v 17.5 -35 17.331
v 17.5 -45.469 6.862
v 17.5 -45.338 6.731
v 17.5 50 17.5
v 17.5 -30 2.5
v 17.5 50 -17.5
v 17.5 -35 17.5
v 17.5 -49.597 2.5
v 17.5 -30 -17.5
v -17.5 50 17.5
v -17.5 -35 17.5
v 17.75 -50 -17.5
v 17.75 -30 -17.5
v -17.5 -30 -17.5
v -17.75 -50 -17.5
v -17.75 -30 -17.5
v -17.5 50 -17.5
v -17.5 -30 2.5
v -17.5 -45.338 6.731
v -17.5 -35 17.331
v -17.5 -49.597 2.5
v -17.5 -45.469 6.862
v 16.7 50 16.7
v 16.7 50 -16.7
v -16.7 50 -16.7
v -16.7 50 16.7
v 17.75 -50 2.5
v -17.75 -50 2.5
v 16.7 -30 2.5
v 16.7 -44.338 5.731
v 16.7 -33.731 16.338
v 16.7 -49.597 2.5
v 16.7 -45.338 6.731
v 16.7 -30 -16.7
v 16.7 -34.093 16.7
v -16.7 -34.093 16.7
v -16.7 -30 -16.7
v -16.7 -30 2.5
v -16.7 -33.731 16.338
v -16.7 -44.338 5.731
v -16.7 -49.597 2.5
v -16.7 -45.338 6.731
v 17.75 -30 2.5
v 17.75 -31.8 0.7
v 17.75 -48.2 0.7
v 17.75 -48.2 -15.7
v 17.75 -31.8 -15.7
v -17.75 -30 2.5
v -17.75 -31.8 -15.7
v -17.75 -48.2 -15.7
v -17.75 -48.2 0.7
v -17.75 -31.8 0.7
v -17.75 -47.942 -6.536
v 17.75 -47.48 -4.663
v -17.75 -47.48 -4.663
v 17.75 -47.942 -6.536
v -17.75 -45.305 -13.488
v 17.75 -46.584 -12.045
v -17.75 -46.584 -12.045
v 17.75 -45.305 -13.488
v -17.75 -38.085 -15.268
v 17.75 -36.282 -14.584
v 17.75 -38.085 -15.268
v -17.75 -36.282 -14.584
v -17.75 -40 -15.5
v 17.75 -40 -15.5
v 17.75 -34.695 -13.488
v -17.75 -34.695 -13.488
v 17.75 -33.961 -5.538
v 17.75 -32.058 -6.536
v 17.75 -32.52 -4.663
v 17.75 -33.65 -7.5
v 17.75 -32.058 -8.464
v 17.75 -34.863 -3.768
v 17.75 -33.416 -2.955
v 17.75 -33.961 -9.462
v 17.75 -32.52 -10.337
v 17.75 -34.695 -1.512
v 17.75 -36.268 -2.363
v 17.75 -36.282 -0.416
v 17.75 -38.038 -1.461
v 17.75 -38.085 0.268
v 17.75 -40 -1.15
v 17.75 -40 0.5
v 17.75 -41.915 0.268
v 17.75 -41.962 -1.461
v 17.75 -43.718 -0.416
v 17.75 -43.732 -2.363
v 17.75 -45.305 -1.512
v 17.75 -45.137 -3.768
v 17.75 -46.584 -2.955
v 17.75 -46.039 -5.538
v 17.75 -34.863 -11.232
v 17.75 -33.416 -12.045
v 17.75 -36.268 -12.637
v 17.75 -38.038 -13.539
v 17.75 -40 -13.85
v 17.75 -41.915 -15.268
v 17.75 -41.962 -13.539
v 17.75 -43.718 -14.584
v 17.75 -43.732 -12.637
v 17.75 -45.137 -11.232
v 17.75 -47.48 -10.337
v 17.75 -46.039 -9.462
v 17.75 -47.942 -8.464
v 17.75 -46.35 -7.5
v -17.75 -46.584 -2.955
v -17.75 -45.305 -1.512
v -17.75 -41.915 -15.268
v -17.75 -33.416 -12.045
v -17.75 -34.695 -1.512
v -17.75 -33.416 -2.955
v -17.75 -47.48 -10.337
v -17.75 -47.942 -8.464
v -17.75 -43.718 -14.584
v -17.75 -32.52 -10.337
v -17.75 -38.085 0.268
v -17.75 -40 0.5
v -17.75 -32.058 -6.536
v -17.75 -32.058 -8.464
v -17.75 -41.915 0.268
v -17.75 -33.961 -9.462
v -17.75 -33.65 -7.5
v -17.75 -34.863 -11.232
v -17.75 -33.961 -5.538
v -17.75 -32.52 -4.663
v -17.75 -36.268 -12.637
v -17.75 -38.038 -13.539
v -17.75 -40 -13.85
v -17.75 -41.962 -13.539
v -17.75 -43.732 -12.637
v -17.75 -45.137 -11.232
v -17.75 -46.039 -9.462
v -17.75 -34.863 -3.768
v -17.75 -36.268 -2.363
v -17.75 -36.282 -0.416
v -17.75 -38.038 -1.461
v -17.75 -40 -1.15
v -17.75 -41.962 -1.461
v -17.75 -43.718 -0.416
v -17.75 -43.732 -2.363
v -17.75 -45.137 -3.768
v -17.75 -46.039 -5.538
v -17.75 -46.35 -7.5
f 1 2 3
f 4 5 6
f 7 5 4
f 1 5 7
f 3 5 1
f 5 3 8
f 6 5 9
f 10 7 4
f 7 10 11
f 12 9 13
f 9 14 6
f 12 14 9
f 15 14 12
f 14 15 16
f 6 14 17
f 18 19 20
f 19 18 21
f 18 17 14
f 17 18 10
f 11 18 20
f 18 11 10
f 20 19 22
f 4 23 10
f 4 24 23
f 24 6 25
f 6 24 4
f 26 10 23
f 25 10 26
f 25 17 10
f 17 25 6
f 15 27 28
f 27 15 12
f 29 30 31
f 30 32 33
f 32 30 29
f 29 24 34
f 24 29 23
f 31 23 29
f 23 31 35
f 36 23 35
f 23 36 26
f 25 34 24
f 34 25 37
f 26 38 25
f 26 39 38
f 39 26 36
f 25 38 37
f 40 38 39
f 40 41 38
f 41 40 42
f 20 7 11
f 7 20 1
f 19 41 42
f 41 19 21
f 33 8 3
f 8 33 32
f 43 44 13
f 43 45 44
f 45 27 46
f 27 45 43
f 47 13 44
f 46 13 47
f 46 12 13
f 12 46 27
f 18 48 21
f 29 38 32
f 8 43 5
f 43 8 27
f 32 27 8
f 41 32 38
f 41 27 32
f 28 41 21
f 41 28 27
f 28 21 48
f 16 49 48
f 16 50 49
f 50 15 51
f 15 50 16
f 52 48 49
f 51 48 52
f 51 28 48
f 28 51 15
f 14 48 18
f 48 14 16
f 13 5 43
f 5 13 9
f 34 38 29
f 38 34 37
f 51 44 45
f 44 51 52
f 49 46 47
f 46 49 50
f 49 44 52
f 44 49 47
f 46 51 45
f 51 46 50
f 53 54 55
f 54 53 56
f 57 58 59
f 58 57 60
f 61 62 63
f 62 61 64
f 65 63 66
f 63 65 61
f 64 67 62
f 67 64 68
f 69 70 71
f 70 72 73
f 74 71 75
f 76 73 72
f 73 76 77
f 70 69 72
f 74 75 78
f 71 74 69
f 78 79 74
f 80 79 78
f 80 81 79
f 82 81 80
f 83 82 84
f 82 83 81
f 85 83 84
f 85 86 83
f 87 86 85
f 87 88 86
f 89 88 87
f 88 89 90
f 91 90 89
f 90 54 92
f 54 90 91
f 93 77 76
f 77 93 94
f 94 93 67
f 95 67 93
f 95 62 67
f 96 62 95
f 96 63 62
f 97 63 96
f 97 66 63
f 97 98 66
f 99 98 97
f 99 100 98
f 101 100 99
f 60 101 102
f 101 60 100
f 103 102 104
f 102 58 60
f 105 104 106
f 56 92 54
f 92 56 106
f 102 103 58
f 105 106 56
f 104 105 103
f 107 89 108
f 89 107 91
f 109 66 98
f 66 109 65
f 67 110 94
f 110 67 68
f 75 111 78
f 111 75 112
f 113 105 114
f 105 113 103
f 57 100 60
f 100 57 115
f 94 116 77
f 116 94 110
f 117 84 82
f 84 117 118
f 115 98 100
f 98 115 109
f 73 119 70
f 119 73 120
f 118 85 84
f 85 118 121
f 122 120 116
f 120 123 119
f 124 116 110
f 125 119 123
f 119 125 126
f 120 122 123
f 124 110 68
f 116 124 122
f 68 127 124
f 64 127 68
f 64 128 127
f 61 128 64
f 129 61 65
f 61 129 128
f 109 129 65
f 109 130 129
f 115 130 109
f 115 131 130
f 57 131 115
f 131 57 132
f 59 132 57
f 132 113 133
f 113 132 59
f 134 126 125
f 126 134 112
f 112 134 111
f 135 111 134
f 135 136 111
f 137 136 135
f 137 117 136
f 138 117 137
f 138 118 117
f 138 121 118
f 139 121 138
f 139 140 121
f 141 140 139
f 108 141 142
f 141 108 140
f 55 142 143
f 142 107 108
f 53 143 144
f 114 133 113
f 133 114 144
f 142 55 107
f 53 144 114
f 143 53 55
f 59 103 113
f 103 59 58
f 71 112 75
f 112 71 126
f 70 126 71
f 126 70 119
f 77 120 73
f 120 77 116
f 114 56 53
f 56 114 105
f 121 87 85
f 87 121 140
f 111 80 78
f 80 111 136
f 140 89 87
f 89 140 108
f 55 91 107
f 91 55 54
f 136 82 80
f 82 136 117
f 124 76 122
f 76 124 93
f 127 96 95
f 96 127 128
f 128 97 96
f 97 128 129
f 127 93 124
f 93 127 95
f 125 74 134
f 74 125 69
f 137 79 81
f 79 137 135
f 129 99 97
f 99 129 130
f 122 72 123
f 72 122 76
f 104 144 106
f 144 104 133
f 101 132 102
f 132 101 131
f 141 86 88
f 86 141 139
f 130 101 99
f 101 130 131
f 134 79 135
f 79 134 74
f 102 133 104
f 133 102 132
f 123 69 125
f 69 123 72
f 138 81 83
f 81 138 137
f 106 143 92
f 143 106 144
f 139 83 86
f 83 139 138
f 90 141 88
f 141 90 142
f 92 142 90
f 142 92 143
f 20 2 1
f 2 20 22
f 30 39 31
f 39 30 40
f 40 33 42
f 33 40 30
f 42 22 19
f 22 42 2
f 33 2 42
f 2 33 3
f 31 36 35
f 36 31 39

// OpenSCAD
difference(){
    cube([35,100,35],center=true);
    cube([33.4,102,33.4],center=true);
    translate([0,-41,-8.5]) cube([37,21,21],center=true);
    translate([-18.5,-50.1,2]) rotate([0,90,0]) linear_extrude(height=37){
        polygon([[0,0],[-17,0],[-17,15.1],[-15,15.1]]);
    }
}

translate([0,-40,-7.5]) difference(){
    cube([35.5,20,20],center=true);
    cube([38,16.4,16.4],center=true);
}

translate([0,-39.6,11.6]) 
        rotate([45,0,0]) cube([35,15,1.6],center=true);

translate([-17.75,-40,-7.5]) rotate([0,90,0]) difference(){
    cylinder(r=8,h=35.5);
    translate([0,0,-1]) cylinder(r=6.35,h=38);
}
